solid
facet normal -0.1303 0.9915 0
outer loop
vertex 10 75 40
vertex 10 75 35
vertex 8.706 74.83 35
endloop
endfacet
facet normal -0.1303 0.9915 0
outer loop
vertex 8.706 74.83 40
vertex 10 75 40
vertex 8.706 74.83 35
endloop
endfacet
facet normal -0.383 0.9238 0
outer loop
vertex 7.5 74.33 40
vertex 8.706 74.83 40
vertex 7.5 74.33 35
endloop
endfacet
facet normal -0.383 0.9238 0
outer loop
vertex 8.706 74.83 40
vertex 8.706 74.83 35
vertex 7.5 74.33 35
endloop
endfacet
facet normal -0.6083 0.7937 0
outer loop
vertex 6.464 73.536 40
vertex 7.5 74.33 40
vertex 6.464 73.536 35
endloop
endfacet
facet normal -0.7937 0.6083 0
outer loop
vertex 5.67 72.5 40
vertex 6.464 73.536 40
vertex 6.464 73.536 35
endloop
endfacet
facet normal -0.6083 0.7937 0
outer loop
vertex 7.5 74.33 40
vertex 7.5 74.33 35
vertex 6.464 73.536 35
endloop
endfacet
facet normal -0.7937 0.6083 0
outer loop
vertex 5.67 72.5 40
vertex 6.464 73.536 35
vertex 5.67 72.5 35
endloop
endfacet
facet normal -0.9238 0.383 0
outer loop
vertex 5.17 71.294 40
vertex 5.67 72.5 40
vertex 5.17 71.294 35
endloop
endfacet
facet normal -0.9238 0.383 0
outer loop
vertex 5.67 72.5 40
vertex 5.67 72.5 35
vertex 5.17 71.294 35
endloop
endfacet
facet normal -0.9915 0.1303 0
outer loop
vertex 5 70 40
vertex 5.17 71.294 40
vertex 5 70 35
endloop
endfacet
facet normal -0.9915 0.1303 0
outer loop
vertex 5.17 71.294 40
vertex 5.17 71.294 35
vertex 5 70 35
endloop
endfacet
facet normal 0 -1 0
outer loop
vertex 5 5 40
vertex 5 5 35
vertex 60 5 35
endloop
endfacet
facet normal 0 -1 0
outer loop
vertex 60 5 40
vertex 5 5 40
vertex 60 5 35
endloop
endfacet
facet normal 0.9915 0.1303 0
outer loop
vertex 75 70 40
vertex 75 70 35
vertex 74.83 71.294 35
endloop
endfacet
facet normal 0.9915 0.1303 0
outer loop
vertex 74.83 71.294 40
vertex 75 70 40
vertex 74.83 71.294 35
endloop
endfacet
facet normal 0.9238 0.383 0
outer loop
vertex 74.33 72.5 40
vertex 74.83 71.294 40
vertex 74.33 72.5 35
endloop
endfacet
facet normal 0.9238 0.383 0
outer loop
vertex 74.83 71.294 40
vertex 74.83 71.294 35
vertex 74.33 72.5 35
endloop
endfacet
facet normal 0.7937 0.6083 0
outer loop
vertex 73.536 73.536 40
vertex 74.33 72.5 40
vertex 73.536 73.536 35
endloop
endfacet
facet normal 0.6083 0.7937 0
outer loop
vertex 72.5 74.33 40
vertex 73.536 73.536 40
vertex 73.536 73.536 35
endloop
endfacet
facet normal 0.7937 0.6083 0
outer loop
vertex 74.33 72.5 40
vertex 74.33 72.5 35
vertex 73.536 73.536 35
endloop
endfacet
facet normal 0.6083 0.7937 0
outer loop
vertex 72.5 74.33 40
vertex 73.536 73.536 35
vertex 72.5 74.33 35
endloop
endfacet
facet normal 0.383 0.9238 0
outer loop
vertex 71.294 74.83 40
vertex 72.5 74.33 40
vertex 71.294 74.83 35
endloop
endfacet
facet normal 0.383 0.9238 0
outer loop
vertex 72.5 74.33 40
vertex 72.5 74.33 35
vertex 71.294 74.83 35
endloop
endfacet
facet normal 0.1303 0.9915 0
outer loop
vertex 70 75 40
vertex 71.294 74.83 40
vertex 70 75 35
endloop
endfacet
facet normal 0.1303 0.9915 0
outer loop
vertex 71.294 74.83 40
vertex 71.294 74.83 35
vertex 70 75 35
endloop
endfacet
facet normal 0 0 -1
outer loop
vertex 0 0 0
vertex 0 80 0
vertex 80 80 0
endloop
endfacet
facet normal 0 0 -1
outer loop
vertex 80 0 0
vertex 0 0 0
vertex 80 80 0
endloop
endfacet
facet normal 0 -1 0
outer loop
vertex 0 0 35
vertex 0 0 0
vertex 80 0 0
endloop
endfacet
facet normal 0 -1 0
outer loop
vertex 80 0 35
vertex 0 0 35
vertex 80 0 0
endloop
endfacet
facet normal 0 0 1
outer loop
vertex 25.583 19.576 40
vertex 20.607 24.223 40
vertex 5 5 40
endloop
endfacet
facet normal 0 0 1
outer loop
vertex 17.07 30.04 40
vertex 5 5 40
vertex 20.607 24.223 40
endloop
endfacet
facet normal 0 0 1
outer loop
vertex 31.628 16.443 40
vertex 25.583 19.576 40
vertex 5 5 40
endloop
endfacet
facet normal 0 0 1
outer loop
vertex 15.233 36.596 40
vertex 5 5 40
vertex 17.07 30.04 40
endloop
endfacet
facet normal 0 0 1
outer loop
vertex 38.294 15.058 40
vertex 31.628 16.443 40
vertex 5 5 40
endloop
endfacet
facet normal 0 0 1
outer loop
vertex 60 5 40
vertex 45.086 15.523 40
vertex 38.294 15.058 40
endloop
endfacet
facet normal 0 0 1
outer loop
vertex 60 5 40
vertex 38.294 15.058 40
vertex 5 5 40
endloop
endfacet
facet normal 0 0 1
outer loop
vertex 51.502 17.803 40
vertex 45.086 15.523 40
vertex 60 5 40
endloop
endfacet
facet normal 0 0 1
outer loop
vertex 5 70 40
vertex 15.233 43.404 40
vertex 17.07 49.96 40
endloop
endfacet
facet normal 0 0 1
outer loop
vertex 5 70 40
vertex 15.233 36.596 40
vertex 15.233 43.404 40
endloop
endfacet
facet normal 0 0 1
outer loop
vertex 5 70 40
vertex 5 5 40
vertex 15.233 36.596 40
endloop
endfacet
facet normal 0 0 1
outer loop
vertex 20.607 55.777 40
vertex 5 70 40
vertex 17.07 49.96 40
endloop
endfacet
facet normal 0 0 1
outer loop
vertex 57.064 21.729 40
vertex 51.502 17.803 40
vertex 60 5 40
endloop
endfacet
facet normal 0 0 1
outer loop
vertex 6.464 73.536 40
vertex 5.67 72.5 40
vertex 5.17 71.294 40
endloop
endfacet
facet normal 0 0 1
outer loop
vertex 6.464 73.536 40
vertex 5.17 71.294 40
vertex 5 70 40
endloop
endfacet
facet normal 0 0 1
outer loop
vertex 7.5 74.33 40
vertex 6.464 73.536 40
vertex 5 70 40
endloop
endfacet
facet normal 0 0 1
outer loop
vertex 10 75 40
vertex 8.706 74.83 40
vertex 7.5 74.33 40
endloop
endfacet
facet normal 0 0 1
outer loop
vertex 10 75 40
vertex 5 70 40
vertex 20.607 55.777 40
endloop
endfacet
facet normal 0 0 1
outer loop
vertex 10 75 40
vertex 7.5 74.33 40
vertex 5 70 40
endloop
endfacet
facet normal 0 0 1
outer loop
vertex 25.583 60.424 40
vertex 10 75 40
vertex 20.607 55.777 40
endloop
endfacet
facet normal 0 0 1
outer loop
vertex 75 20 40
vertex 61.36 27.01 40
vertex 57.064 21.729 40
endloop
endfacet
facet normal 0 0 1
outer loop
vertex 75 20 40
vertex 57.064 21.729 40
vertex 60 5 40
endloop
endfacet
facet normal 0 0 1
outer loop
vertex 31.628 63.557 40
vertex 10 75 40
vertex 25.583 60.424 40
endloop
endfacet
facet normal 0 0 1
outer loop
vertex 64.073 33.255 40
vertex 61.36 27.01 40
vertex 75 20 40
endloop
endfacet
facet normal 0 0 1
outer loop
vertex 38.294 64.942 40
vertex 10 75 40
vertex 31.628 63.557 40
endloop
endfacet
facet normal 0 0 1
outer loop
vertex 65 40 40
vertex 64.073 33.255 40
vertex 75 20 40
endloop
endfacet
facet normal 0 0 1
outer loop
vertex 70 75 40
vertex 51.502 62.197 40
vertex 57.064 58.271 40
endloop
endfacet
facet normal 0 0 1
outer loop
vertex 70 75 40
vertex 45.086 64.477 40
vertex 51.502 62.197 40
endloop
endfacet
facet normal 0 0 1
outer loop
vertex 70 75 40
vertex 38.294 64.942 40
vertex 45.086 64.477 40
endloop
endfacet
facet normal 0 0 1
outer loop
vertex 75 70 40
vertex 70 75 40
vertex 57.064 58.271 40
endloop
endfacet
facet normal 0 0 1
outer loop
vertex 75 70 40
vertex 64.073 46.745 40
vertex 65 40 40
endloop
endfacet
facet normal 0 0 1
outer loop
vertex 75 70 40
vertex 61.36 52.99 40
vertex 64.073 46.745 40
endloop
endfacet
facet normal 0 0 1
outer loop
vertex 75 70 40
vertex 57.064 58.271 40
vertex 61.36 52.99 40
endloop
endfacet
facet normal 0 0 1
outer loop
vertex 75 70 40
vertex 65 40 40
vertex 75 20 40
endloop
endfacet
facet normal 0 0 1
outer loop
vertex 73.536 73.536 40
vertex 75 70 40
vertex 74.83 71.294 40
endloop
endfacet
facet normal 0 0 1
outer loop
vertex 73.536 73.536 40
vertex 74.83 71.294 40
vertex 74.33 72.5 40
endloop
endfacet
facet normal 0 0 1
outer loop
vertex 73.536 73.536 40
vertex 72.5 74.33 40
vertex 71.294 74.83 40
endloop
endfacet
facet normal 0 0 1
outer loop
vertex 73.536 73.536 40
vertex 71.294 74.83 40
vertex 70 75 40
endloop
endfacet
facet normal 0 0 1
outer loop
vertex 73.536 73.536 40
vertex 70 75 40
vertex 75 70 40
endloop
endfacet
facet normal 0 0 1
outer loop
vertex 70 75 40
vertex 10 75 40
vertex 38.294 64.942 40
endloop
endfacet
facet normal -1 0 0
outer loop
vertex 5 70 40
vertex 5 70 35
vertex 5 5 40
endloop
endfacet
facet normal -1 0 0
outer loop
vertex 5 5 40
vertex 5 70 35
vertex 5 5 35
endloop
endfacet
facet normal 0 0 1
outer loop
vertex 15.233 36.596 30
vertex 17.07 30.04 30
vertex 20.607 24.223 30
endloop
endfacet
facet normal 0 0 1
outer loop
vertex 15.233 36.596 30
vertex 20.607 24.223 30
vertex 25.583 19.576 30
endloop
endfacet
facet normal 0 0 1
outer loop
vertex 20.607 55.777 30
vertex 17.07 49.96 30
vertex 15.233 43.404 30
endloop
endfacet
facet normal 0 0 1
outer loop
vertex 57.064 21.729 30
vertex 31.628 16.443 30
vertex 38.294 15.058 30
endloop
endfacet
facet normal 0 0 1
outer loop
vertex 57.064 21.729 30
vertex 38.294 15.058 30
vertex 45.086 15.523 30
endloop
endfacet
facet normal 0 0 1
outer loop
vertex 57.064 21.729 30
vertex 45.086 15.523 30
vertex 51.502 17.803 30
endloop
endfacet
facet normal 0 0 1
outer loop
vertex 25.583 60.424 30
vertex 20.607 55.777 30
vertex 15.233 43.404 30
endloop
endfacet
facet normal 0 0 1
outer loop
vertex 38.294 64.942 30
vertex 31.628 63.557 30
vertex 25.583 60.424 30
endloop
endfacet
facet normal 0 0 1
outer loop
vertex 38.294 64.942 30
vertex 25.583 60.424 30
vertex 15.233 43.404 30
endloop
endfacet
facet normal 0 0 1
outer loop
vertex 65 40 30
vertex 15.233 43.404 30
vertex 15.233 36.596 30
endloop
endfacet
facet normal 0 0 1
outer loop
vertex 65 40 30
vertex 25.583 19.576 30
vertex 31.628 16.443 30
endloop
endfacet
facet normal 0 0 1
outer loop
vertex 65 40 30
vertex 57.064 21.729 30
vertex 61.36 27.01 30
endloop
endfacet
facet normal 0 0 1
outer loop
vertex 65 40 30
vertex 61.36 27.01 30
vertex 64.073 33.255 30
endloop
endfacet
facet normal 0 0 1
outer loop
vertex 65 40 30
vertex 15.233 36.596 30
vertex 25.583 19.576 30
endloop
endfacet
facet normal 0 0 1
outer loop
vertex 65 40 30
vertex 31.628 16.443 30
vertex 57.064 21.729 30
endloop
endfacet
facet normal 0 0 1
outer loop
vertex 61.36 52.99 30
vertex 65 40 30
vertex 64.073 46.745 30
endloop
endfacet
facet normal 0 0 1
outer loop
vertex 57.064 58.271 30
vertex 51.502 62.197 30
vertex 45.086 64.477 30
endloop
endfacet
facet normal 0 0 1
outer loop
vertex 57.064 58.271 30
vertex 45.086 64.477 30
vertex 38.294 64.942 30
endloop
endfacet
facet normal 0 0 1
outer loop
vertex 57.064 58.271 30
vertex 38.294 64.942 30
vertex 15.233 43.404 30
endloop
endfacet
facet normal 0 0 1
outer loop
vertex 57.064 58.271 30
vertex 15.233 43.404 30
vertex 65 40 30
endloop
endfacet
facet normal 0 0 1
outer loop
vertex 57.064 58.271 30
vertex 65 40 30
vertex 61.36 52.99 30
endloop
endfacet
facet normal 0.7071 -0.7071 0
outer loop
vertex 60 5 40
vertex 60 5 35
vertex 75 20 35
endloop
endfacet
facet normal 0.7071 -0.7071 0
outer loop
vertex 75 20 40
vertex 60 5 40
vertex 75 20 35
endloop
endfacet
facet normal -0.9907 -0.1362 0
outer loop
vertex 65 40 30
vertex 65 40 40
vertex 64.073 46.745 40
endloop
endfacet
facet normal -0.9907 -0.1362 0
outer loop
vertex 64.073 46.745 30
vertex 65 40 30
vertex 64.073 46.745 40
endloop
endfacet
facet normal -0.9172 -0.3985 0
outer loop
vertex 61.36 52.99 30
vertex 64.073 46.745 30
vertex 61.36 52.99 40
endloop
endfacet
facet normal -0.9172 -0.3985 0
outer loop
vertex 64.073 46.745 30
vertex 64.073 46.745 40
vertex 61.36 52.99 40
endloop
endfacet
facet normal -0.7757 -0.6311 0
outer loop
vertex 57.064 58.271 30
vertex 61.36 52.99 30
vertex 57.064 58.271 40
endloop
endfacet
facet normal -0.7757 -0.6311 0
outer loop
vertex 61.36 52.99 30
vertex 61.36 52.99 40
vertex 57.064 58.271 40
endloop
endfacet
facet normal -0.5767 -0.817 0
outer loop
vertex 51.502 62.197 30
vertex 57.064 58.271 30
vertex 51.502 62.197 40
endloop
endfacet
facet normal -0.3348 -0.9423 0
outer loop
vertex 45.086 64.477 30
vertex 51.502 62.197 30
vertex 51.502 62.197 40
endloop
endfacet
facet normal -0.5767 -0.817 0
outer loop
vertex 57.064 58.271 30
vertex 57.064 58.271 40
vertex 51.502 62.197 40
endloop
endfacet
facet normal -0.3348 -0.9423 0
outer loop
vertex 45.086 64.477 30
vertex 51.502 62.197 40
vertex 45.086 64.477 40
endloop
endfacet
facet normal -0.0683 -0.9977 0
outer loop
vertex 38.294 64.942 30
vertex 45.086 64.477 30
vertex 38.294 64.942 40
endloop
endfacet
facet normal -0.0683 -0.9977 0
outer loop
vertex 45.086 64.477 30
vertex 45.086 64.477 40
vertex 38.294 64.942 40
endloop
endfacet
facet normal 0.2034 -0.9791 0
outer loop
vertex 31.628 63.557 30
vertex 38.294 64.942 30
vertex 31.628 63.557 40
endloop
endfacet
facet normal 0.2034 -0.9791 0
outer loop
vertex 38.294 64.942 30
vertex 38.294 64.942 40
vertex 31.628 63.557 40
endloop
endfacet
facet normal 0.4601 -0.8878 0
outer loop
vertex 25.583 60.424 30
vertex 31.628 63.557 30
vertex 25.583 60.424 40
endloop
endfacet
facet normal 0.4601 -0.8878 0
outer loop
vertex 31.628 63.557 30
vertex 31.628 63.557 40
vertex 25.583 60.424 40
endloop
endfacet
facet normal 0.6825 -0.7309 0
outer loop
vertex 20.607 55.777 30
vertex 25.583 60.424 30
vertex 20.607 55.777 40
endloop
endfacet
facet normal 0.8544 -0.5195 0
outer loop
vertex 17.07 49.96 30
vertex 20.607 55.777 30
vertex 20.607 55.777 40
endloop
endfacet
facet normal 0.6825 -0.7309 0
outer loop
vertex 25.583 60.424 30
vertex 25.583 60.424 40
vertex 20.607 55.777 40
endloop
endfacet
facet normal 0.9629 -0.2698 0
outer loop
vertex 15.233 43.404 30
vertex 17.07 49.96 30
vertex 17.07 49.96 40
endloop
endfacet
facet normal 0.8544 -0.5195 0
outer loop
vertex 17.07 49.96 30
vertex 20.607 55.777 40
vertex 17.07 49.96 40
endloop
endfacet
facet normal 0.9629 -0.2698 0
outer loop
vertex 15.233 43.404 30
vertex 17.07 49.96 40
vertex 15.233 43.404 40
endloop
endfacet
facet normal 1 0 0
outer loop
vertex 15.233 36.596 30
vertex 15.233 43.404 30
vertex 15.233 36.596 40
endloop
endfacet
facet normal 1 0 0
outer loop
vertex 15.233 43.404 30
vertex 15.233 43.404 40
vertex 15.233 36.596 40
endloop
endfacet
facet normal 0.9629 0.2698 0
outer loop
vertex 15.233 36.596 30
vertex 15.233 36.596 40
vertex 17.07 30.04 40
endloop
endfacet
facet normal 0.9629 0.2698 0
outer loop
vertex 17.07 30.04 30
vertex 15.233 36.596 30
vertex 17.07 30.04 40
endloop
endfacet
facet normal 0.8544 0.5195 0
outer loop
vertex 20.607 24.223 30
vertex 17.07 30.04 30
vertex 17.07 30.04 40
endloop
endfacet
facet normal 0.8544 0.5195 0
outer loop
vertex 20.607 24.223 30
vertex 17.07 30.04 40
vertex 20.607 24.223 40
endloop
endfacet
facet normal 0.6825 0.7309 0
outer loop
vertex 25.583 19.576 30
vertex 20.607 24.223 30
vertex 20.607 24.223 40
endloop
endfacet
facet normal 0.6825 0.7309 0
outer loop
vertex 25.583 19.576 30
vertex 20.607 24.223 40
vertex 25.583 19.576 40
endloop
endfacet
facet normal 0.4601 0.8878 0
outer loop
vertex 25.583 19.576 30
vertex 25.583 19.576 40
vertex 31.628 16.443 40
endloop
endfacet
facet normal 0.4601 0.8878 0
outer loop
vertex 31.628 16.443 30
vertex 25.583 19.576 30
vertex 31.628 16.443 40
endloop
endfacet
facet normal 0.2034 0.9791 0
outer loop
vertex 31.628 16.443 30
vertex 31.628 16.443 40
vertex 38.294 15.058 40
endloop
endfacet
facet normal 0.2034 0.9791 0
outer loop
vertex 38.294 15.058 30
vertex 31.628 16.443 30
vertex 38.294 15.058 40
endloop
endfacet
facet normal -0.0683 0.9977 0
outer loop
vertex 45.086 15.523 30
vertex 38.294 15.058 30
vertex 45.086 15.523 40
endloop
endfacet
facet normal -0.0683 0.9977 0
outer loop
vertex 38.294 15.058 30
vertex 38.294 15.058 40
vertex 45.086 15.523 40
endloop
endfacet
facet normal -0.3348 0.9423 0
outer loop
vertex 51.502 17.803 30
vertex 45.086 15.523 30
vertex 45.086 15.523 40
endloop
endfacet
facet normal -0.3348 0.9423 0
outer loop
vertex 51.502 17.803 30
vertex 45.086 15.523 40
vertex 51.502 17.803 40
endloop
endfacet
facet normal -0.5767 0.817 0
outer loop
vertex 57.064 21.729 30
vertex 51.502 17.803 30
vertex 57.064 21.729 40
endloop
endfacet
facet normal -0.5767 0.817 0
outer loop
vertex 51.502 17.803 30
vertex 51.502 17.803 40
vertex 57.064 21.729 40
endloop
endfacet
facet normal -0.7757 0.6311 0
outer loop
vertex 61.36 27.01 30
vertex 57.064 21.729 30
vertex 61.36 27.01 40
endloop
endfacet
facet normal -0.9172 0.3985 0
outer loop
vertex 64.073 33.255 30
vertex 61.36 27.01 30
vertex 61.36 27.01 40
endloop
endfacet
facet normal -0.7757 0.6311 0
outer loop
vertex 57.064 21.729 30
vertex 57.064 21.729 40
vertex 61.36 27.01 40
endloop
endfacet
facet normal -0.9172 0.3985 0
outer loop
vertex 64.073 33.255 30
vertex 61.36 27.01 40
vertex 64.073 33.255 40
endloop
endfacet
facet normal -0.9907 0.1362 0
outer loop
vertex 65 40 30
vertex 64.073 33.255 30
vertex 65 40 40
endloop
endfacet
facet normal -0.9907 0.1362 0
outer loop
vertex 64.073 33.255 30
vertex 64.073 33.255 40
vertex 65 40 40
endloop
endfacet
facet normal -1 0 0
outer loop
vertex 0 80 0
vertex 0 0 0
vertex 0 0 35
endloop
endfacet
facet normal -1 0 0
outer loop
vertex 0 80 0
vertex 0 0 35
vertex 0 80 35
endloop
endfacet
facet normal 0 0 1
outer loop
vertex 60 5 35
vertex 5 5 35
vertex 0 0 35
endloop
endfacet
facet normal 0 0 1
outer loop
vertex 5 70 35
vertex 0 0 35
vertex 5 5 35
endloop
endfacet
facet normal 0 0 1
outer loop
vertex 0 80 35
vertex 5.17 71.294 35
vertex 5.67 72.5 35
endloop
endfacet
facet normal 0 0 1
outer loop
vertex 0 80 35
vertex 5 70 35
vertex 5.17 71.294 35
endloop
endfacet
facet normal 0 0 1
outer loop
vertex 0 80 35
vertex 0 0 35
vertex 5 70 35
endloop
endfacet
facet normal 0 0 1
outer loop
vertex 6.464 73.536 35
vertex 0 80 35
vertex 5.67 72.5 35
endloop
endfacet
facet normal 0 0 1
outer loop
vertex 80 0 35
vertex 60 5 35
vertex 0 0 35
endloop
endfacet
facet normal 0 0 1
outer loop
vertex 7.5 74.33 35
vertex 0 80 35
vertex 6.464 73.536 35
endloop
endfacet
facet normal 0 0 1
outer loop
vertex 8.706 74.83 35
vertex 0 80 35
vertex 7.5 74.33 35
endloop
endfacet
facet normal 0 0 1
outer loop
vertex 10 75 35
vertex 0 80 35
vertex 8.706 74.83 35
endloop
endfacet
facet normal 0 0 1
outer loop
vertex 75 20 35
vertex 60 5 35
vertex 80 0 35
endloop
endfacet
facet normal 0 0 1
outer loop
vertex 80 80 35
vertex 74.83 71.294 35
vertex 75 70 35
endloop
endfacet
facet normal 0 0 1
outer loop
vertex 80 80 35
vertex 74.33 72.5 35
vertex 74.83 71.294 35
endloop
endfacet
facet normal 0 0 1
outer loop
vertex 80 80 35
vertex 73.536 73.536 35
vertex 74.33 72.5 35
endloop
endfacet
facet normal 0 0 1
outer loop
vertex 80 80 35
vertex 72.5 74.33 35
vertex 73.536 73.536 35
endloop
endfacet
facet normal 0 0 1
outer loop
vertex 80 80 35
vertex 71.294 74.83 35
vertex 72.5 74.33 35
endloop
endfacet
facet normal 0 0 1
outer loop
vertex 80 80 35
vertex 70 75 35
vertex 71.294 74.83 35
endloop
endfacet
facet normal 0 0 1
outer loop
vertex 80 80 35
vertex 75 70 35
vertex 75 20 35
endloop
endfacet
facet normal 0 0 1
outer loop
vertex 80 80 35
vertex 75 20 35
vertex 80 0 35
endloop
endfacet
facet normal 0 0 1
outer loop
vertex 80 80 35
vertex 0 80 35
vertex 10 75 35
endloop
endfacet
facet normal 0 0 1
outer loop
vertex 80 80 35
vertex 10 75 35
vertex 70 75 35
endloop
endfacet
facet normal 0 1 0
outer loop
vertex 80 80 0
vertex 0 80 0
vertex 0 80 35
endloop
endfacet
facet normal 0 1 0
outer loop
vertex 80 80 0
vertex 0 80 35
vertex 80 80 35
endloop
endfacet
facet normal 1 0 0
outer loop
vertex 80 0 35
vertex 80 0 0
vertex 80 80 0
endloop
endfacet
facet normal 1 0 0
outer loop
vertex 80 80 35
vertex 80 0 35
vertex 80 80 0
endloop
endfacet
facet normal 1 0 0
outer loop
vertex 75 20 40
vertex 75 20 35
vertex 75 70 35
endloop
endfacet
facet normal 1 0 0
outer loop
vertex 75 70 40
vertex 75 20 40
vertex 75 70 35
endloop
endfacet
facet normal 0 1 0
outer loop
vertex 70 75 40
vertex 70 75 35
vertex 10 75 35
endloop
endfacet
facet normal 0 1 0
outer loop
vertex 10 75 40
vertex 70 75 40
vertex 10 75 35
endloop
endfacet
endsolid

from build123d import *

# Parameters (mm, degrees)
SKETCH1_W           = 80
SKETCH1_H           = 80
BOSS_EXTRUDE1_DEPTH = 35
BOSS_EXTRUDE2_START = 35
BOSS_EXTRUDE2_DEPTH = 5
CUT_EXTRUDE1_START  = 40
SKETCH3_R           = 25
CUT_EXTRUDE1_DEPTH  = 10


with BuildPart() as part:
    # Sketch1 → Boss-Extrude1 (new body)
    with BuildSketch(Plane.XY):
        with Locations((40, 40)):
            Rectangle(SKETCH1_W, SKETCH1_H)
    extrude(amount=BOSS_EXTRUDE1_DEPTH)

    # Sketch2 → Boss-Extrude2 (add)
    with BuildSketch(Plane.XY.offset(BOSS_EXTRUDE2_START)):
        with BuildLine():
            Line((60, 5), (75, 20))
            Line((75, 20), (75, 70))
            ThreePointArc((75, 70), (73.535533906, 73.535533906), (70, 75))
            Line((70, 75), (10, 75))
            ThreePointArc((10, 75), (6.464466094, 73.535533906), (5, 70))
            Line((5, 70), (5, 5))
            Line((5, 5), (60, 5))
        make_face()
    extrude(amount=BOSS_EXTRUDE2_DEPTH)

    # Sketch3 → Cut-Extrude1 (cut)
    with BuildSketch(Plane.XY.offset(CUT_EXTRUDE1_START)):
        with Locations((40, 40)):
            Circle(SKETCH3_R)
    extrude(amount=-CUT_EXTRUDE1_DEPTH, mode=Mode.SUBTRACT)


solid = part.part
